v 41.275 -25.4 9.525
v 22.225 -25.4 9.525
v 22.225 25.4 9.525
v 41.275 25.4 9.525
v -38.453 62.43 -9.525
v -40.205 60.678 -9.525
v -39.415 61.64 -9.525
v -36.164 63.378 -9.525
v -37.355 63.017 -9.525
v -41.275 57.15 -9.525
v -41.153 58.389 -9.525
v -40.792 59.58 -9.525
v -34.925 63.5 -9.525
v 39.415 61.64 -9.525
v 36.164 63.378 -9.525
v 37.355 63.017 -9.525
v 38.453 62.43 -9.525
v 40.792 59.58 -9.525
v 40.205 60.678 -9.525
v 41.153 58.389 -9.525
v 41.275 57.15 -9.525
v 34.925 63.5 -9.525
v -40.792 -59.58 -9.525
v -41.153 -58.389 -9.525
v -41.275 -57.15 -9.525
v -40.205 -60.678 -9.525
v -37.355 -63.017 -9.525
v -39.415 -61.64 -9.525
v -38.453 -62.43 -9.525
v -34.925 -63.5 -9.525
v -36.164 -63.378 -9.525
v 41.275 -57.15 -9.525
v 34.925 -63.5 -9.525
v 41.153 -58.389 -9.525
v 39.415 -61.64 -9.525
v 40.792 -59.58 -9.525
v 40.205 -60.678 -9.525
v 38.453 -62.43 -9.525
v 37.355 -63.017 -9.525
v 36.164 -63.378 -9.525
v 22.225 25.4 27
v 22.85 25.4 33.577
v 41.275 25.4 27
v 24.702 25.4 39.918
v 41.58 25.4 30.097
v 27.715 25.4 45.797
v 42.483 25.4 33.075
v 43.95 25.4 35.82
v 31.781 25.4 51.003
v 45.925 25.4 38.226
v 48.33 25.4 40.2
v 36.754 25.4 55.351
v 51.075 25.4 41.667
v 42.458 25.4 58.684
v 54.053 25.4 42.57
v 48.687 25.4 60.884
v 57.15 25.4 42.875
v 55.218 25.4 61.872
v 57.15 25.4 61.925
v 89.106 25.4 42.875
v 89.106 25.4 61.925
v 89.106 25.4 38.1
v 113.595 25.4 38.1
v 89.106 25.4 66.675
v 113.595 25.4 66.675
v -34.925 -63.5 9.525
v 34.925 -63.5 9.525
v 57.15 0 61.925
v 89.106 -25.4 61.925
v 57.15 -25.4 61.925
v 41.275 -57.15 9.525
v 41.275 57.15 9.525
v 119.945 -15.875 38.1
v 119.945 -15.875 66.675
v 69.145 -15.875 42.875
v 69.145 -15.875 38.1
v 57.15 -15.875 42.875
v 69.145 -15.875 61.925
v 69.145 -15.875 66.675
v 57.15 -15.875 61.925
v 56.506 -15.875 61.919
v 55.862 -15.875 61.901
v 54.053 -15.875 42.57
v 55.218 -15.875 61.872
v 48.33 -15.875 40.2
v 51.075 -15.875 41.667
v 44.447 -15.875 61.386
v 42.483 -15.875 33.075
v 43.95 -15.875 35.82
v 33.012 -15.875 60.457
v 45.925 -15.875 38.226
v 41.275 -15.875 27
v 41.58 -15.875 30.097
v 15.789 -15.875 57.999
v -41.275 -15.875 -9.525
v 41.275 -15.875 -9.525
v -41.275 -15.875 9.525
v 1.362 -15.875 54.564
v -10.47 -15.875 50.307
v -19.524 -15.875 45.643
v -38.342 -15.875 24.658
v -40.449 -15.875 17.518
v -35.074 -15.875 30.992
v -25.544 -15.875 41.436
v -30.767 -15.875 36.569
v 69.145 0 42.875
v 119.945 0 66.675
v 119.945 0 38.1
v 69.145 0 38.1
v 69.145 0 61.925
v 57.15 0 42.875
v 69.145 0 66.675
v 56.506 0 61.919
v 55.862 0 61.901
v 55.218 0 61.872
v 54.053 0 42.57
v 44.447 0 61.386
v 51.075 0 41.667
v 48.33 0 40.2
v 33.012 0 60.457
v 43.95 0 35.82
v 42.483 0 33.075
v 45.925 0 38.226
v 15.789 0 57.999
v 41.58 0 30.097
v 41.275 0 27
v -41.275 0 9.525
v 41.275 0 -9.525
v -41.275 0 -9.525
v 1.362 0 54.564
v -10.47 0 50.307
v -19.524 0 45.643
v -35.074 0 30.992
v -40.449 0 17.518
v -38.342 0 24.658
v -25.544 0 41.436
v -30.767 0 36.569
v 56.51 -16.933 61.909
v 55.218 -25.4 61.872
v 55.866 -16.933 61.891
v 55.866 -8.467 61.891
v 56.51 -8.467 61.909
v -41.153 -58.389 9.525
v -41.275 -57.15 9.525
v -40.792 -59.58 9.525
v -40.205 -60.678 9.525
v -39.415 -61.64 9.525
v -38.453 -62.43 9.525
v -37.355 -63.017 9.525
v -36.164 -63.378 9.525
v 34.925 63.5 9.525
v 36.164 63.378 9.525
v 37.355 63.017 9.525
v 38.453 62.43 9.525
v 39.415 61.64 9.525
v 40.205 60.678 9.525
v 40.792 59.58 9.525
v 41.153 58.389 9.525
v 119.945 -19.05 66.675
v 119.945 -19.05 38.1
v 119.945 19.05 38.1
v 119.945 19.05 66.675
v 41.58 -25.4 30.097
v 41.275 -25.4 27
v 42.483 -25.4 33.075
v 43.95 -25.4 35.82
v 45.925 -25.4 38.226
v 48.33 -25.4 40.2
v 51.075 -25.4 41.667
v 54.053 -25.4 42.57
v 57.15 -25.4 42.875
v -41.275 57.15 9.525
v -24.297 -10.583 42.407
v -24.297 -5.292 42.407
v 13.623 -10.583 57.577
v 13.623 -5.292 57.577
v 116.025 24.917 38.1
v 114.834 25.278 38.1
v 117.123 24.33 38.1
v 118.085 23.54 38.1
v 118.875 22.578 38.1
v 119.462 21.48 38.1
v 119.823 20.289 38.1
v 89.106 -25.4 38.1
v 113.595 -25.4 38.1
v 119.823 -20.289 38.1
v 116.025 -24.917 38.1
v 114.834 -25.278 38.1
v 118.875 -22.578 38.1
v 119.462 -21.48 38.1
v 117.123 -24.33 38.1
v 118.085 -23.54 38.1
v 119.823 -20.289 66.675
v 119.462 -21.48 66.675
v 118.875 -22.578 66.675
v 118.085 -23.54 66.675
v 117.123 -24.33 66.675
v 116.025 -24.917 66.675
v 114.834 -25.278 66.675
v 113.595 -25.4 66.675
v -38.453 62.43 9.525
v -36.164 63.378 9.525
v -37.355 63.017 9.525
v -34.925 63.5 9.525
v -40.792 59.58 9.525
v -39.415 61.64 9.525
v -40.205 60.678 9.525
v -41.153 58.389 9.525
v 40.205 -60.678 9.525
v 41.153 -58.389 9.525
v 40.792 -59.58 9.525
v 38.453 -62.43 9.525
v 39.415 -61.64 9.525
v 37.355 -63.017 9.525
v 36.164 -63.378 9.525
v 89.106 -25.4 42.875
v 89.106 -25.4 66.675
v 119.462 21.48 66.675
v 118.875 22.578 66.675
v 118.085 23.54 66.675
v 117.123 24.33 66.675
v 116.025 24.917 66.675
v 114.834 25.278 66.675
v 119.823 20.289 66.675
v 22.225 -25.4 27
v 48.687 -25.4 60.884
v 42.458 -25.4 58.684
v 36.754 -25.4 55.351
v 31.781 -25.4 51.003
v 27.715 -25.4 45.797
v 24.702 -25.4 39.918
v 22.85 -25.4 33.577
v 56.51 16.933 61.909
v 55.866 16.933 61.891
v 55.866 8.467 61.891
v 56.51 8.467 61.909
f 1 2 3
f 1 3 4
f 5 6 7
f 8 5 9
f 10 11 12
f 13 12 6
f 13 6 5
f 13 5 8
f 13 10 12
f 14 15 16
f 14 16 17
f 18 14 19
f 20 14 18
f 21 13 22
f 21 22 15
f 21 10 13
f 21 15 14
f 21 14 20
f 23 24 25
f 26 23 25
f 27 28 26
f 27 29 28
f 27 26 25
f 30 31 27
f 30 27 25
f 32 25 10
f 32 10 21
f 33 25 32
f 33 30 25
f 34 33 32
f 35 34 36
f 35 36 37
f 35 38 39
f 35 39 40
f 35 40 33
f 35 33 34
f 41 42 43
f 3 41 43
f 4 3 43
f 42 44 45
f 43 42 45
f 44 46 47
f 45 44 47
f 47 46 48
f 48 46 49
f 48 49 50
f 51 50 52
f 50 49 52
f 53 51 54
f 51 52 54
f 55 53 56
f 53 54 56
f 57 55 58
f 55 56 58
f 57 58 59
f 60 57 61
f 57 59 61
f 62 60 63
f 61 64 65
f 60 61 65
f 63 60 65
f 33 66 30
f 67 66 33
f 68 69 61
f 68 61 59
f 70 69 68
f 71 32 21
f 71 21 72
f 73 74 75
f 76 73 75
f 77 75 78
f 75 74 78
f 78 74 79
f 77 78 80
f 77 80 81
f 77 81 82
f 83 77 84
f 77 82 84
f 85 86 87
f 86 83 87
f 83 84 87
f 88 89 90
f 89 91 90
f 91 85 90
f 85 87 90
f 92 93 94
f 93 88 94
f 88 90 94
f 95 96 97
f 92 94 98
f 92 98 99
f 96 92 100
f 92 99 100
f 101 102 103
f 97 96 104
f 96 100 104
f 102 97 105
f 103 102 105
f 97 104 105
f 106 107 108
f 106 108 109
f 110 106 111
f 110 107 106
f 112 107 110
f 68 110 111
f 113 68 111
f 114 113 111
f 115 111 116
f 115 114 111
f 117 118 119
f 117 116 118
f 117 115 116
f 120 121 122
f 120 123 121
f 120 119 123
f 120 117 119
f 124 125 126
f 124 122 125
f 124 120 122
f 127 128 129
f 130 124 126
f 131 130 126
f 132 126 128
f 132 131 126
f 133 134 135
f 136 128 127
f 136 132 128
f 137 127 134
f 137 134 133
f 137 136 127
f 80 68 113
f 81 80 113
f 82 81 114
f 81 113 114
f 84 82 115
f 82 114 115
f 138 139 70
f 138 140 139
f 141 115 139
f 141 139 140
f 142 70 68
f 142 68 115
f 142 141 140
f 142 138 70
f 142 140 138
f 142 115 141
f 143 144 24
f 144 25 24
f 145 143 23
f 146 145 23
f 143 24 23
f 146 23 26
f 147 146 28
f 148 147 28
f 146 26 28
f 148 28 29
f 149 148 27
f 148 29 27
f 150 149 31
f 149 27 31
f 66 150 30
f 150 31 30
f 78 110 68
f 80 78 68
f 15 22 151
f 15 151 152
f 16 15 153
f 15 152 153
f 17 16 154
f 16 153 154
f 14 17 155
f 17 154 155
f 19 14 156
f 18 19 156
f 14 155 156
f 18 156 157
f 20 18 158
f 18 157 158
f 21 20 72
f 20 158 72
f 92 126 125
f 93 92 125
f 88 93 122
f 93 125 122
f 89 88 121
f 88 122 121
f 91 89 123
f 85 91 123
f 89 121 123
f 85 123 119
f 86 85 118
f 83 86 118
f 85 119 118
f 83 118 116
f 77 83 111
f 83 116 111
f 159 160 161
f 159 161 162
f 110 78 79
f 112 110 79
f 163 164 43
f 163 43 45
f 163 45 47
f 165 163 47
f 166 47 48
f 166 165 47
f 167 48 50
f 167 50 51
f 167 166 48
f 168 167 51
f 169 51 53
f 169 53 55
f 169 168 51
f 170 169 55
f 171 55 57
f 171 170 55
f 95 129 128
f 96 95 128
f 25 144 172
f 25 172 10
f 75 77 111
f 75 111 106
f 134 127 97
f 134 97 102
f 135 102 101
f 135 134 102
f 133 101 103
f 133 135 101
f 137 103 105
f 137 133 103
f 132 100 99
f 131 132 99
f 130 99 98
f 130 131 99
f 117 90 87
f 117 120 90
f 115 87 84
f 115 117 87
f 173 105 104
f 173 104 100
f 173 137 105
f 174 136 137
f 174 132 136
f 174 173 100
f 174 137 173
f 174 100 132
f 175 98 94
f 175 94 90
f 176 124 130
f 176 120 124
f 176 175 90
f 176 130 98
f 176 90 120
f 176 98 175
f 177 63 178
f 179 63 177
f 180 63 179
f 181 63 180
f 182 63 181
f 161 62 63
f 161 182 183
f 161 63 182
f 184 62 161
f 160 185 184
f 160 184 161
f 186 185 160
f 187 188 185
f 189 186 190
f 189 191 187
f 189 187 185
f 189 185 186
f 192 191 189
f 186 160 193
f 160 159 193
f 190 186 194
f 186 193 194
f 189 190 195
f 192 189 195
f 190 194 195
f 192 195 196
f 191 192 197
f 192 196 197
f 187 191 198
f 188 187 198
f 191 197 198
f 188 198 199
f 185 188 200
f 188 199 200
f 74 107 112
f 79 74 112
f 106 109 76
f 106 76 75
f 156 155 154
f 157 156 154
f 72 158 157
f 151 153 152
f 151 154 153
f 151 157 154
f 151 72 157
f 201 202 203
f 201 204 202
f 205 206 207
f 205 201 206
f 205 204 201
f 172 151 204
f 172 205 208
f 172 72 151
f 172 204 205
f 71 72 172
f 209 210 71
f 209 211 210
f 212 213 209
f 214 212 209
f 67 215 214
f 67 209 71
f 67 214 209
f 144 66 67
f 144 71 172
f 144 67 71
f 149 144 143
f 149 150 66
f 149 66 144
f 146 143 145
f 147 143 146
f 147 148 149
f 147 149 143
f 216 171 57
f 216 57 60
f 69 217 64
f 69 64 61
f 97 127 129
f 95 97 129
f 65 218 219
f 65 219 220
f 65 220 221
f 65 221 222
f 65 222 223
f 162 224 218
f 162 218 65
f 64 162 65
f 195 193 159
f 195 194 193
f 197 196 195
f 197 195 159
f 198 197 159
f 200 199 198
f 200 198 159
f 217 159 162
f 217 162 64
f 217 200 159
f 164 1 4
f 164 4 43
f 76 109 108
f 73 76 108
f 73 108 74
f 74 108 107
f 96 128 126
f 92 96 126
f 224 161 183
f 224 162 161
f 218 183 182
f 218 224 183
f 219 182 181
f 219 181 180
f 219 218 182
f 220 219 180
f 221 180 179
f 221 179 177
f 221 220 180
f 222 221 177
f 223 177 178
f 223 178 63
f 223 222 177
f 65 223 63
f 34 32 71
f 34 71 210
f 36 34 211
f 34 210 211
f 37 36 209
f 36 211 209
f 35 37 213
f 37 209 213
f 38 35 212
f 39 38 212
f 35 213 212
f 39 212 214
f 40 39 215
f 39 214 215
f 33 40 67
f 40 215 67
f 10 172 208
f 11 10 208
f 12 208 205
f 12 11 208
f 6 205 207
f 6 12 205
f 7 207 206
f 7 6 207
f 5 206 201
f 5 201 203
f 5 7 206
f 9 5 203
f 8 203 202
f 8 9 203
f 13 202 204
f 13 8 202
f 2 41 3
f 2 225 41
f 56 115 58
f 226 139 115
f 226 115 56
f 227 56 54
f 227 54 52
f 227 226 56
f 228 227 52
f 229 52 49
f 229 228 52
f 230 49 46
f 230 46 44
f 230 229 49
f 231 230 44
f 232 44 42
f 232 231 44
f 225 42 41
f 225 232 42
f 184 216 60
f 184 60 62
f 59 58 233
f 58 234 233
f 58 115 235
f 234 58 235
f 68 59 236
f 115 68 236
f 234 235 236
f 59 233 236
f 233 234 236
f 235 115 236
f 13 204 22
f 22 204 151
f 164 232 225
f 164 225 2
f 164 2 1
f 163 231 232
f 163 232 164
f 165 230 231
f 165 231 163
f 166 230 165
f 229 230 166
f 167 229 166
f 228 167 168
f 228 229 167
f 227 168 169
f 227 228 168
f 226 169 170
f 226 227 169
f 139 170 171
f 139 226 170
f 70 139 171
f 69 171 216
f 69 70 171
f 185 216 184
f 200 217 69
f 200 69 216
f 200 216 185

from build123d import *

# Parameters (mm, degrees)
F1_DEPTH = 63.5
F0_W     = 19.9607688333
F0_H     = 19.05
F2_DEPTH = 25.4
F0_H_2   = 4.7498
F0_H_3   = 4.7752
F3_DEPTH = 15.875
F4_R     = 6.35
F5_R     = 6.35
F5_2_R   = 6.35


with BuildPart() as f1:
    # F0 (on Front) → F1 (new body, symmetric)
    with BuildSketch(Plane.XZ):
        Polygon((22.225, 9.525), (-41.275, 9.525), (-41.275, -9.525), (41.275, -9.525), (41.275, 9.525), align=None)
    extrude(amount=F1_DEPTH, both=True)

    # F4
    f4_edges = [f1.edges().sort_by_distance(p)[0] for p in [
        (41.275, -63.5, 0),
        (-41.275, -63.5, 0),
    ]]
    fillet(f4_edges, radius=F4_R)

    # F5
    f5_edges = [f1.edges().sort_by_distance(p)[0] for p in [
        (-41.275, 63.5, 0),
        (41.275, 63.5, 0),
    ]]
    fillet(f5_edges, radius=F5_R)


with BuildPart() as f2:
    # F0 (on Front) → F2 (new body, symmetric)
    with BuildSketch(Plane.XZ):
        with BuildLine():
            Line((22.225, 27.0002), (22.225, 9.525))
            Line((22.225, 9.525), (41.275, 9.525))
            Line((41.275, 9.525), (41.275, 27.0002))
            ThreePointArc((41.275, 27.0002), (45.9246798487, 38.2255201513), (57.15, 42.8752))
            Line((57.15, 42.8752), (69.1451832609, 42.8752))
            Line((69.1451832609, 42.8752), (69.1451832609, 61.9252))
            Line((69.1451832609, 61.9252), (57.15, 61.9252))
            add(Edge.make_bspline(
                [(55.2183471254, 61.8717405764), (55.8684330606, 61.8913124255), (56.5124503776, 61.9090795737), (57.15, 61.9252)],
                knots=[109.6132876534, 109.6132876534, 109.6132876534, 109.6132876534, 111.5045361635, 111.5045361635, 111.5045361635, 111.5045361635], degree=3))
            ThreePointArc((55.2183471254, 61.8717405764), (31.7805439392, 51.0032482268), (22.225, 27.0002))
        make_face()
        Polygon((89.1059520942, 66.675), (89.1059520942, 61.9252), (89.1059520942, 42.8752), (89.1059520942, 38.1), (119.9451832609, 38.1), (119.9451832609, 66.675), align=None)
        with Locations((79.1255676775, 52.4002)):
            Rectangle(F0_W, F0_H)
    extrude(amount=F2_DEPTH, both=True)

    # F5#2
    f5_2_edges = [f2.edges().sort_by_distance(p)[0] for p in [
        (119.945183, 25.4, 52.3875),
        (119.945183, -25.4, 52.3875),
    ]]
    fillet(f5_2_edges, radius=F5_2_R)


with BuildPart() as f3:
    # F0 (on Front) → F3 (new body)
    with BuildSketch(Plane.XZ):
        with BuildLine():
            add(Edge.make_bspline(
                [(-41.275, 9.525), (-40.5226152352, 53.5407855983), (17.5405611339, 60.7373921763), (55.2183471254, 61.8717405764)],
                knots=[0, 0, 0, 0, 109.6132876534, 109.6132876534, 109.6132876534, 109.6132876534], degree=3))
            Line((-41.275, 9.525), (22.225, 9.525))
            Line((22.225, 9.525), (22.225, 27.0002))
            ThreePointArc((22.225, 27.0002), (31.7805439392, 51.0032482268), (55.2183471254, 61.8717405764))
        make_face()
        Polygon((22.225, 9.525), (-41.275, 9.525), (-41.275, -9.525), (41.275, -9.525), (41.275, 9.525), align=None)
        with BuildLine():
            Line((22.225, 27.0002), (22.225, 9.525))
            Line((22.225, 9.525), (41.275, 9.525))
            Line((41.275, 9.525), (41.275, 27.0002))
            ThreePointArc((41.275, 27.0002), (45.9246798487, 38.2255201513), (57.15, 42.8752))
            Line((57.15, 42.8752), (69.1451832609, 42.8752))
            Line((69.1451832609, 42.8752), (69.1451832609, 61.9252))
            Line((69.1451832609, 61.9252), (57.15, 61.9252))
            add(Edge.make_bspline(
                [(55.2183471254, 61.8717405764), (55.8684330606, 61.8913124255), (56.5124503776, 61.9090795737), (57.15, 61.9252)],
                knots=[109.6132876534, 109.6132876534, 109.6132876534, 109.6132876534, 111.5045361635, 111.5045361635, 111.5045361635, 111.5045361635], degree=3))
            ThreePointArc((55.2183471254, 61.8717405764), (31.7805439392, 51.0032482268), (22.225, 27.0002))
        make_face()
        with BuildLine():
            ThreePointArc((57.15, 61.9252), (56.1838037547, 61.9118325859), (55.2183471254, 61.8717405764))
            add(Edge.make_bspline(
                [(55.2183471254, 61.8717405764), (55.8684330606, 61.8913124255), (56.5124503776, 61.9090795737), (57.15, 61.9252)],
                knots=[109.6132876534, 109.6132876534, 109.6132876534, 109.6132876534, 111.5045361635, 111.5045361635, 111.5045361635, 111.5045361635], degree=3))
        make_face()
        with Locations((79.1255676775, 52.4002)):
            Rectangle(F0_W, F0_H)
        with Locations((79.1255676775, 64.3001)):
            Rectangle(F0_W, F0_H_2)
        with Locations((79.1255676775, 40.4876)):
            Rectangle(F0_W, F0_H_3)
        Polygon((89.1059520942, 66.675), (89.1059520942, 61.9252), (89.1059520942, 42.8752), (89.1059520942, 38.1), (119.9451832609, 38.1), (119.9451832609, 66.675), align=None)
    extrude(amount=F3_DEPTH)


solid = Compound([f1.part, f2.part, f3.part])
